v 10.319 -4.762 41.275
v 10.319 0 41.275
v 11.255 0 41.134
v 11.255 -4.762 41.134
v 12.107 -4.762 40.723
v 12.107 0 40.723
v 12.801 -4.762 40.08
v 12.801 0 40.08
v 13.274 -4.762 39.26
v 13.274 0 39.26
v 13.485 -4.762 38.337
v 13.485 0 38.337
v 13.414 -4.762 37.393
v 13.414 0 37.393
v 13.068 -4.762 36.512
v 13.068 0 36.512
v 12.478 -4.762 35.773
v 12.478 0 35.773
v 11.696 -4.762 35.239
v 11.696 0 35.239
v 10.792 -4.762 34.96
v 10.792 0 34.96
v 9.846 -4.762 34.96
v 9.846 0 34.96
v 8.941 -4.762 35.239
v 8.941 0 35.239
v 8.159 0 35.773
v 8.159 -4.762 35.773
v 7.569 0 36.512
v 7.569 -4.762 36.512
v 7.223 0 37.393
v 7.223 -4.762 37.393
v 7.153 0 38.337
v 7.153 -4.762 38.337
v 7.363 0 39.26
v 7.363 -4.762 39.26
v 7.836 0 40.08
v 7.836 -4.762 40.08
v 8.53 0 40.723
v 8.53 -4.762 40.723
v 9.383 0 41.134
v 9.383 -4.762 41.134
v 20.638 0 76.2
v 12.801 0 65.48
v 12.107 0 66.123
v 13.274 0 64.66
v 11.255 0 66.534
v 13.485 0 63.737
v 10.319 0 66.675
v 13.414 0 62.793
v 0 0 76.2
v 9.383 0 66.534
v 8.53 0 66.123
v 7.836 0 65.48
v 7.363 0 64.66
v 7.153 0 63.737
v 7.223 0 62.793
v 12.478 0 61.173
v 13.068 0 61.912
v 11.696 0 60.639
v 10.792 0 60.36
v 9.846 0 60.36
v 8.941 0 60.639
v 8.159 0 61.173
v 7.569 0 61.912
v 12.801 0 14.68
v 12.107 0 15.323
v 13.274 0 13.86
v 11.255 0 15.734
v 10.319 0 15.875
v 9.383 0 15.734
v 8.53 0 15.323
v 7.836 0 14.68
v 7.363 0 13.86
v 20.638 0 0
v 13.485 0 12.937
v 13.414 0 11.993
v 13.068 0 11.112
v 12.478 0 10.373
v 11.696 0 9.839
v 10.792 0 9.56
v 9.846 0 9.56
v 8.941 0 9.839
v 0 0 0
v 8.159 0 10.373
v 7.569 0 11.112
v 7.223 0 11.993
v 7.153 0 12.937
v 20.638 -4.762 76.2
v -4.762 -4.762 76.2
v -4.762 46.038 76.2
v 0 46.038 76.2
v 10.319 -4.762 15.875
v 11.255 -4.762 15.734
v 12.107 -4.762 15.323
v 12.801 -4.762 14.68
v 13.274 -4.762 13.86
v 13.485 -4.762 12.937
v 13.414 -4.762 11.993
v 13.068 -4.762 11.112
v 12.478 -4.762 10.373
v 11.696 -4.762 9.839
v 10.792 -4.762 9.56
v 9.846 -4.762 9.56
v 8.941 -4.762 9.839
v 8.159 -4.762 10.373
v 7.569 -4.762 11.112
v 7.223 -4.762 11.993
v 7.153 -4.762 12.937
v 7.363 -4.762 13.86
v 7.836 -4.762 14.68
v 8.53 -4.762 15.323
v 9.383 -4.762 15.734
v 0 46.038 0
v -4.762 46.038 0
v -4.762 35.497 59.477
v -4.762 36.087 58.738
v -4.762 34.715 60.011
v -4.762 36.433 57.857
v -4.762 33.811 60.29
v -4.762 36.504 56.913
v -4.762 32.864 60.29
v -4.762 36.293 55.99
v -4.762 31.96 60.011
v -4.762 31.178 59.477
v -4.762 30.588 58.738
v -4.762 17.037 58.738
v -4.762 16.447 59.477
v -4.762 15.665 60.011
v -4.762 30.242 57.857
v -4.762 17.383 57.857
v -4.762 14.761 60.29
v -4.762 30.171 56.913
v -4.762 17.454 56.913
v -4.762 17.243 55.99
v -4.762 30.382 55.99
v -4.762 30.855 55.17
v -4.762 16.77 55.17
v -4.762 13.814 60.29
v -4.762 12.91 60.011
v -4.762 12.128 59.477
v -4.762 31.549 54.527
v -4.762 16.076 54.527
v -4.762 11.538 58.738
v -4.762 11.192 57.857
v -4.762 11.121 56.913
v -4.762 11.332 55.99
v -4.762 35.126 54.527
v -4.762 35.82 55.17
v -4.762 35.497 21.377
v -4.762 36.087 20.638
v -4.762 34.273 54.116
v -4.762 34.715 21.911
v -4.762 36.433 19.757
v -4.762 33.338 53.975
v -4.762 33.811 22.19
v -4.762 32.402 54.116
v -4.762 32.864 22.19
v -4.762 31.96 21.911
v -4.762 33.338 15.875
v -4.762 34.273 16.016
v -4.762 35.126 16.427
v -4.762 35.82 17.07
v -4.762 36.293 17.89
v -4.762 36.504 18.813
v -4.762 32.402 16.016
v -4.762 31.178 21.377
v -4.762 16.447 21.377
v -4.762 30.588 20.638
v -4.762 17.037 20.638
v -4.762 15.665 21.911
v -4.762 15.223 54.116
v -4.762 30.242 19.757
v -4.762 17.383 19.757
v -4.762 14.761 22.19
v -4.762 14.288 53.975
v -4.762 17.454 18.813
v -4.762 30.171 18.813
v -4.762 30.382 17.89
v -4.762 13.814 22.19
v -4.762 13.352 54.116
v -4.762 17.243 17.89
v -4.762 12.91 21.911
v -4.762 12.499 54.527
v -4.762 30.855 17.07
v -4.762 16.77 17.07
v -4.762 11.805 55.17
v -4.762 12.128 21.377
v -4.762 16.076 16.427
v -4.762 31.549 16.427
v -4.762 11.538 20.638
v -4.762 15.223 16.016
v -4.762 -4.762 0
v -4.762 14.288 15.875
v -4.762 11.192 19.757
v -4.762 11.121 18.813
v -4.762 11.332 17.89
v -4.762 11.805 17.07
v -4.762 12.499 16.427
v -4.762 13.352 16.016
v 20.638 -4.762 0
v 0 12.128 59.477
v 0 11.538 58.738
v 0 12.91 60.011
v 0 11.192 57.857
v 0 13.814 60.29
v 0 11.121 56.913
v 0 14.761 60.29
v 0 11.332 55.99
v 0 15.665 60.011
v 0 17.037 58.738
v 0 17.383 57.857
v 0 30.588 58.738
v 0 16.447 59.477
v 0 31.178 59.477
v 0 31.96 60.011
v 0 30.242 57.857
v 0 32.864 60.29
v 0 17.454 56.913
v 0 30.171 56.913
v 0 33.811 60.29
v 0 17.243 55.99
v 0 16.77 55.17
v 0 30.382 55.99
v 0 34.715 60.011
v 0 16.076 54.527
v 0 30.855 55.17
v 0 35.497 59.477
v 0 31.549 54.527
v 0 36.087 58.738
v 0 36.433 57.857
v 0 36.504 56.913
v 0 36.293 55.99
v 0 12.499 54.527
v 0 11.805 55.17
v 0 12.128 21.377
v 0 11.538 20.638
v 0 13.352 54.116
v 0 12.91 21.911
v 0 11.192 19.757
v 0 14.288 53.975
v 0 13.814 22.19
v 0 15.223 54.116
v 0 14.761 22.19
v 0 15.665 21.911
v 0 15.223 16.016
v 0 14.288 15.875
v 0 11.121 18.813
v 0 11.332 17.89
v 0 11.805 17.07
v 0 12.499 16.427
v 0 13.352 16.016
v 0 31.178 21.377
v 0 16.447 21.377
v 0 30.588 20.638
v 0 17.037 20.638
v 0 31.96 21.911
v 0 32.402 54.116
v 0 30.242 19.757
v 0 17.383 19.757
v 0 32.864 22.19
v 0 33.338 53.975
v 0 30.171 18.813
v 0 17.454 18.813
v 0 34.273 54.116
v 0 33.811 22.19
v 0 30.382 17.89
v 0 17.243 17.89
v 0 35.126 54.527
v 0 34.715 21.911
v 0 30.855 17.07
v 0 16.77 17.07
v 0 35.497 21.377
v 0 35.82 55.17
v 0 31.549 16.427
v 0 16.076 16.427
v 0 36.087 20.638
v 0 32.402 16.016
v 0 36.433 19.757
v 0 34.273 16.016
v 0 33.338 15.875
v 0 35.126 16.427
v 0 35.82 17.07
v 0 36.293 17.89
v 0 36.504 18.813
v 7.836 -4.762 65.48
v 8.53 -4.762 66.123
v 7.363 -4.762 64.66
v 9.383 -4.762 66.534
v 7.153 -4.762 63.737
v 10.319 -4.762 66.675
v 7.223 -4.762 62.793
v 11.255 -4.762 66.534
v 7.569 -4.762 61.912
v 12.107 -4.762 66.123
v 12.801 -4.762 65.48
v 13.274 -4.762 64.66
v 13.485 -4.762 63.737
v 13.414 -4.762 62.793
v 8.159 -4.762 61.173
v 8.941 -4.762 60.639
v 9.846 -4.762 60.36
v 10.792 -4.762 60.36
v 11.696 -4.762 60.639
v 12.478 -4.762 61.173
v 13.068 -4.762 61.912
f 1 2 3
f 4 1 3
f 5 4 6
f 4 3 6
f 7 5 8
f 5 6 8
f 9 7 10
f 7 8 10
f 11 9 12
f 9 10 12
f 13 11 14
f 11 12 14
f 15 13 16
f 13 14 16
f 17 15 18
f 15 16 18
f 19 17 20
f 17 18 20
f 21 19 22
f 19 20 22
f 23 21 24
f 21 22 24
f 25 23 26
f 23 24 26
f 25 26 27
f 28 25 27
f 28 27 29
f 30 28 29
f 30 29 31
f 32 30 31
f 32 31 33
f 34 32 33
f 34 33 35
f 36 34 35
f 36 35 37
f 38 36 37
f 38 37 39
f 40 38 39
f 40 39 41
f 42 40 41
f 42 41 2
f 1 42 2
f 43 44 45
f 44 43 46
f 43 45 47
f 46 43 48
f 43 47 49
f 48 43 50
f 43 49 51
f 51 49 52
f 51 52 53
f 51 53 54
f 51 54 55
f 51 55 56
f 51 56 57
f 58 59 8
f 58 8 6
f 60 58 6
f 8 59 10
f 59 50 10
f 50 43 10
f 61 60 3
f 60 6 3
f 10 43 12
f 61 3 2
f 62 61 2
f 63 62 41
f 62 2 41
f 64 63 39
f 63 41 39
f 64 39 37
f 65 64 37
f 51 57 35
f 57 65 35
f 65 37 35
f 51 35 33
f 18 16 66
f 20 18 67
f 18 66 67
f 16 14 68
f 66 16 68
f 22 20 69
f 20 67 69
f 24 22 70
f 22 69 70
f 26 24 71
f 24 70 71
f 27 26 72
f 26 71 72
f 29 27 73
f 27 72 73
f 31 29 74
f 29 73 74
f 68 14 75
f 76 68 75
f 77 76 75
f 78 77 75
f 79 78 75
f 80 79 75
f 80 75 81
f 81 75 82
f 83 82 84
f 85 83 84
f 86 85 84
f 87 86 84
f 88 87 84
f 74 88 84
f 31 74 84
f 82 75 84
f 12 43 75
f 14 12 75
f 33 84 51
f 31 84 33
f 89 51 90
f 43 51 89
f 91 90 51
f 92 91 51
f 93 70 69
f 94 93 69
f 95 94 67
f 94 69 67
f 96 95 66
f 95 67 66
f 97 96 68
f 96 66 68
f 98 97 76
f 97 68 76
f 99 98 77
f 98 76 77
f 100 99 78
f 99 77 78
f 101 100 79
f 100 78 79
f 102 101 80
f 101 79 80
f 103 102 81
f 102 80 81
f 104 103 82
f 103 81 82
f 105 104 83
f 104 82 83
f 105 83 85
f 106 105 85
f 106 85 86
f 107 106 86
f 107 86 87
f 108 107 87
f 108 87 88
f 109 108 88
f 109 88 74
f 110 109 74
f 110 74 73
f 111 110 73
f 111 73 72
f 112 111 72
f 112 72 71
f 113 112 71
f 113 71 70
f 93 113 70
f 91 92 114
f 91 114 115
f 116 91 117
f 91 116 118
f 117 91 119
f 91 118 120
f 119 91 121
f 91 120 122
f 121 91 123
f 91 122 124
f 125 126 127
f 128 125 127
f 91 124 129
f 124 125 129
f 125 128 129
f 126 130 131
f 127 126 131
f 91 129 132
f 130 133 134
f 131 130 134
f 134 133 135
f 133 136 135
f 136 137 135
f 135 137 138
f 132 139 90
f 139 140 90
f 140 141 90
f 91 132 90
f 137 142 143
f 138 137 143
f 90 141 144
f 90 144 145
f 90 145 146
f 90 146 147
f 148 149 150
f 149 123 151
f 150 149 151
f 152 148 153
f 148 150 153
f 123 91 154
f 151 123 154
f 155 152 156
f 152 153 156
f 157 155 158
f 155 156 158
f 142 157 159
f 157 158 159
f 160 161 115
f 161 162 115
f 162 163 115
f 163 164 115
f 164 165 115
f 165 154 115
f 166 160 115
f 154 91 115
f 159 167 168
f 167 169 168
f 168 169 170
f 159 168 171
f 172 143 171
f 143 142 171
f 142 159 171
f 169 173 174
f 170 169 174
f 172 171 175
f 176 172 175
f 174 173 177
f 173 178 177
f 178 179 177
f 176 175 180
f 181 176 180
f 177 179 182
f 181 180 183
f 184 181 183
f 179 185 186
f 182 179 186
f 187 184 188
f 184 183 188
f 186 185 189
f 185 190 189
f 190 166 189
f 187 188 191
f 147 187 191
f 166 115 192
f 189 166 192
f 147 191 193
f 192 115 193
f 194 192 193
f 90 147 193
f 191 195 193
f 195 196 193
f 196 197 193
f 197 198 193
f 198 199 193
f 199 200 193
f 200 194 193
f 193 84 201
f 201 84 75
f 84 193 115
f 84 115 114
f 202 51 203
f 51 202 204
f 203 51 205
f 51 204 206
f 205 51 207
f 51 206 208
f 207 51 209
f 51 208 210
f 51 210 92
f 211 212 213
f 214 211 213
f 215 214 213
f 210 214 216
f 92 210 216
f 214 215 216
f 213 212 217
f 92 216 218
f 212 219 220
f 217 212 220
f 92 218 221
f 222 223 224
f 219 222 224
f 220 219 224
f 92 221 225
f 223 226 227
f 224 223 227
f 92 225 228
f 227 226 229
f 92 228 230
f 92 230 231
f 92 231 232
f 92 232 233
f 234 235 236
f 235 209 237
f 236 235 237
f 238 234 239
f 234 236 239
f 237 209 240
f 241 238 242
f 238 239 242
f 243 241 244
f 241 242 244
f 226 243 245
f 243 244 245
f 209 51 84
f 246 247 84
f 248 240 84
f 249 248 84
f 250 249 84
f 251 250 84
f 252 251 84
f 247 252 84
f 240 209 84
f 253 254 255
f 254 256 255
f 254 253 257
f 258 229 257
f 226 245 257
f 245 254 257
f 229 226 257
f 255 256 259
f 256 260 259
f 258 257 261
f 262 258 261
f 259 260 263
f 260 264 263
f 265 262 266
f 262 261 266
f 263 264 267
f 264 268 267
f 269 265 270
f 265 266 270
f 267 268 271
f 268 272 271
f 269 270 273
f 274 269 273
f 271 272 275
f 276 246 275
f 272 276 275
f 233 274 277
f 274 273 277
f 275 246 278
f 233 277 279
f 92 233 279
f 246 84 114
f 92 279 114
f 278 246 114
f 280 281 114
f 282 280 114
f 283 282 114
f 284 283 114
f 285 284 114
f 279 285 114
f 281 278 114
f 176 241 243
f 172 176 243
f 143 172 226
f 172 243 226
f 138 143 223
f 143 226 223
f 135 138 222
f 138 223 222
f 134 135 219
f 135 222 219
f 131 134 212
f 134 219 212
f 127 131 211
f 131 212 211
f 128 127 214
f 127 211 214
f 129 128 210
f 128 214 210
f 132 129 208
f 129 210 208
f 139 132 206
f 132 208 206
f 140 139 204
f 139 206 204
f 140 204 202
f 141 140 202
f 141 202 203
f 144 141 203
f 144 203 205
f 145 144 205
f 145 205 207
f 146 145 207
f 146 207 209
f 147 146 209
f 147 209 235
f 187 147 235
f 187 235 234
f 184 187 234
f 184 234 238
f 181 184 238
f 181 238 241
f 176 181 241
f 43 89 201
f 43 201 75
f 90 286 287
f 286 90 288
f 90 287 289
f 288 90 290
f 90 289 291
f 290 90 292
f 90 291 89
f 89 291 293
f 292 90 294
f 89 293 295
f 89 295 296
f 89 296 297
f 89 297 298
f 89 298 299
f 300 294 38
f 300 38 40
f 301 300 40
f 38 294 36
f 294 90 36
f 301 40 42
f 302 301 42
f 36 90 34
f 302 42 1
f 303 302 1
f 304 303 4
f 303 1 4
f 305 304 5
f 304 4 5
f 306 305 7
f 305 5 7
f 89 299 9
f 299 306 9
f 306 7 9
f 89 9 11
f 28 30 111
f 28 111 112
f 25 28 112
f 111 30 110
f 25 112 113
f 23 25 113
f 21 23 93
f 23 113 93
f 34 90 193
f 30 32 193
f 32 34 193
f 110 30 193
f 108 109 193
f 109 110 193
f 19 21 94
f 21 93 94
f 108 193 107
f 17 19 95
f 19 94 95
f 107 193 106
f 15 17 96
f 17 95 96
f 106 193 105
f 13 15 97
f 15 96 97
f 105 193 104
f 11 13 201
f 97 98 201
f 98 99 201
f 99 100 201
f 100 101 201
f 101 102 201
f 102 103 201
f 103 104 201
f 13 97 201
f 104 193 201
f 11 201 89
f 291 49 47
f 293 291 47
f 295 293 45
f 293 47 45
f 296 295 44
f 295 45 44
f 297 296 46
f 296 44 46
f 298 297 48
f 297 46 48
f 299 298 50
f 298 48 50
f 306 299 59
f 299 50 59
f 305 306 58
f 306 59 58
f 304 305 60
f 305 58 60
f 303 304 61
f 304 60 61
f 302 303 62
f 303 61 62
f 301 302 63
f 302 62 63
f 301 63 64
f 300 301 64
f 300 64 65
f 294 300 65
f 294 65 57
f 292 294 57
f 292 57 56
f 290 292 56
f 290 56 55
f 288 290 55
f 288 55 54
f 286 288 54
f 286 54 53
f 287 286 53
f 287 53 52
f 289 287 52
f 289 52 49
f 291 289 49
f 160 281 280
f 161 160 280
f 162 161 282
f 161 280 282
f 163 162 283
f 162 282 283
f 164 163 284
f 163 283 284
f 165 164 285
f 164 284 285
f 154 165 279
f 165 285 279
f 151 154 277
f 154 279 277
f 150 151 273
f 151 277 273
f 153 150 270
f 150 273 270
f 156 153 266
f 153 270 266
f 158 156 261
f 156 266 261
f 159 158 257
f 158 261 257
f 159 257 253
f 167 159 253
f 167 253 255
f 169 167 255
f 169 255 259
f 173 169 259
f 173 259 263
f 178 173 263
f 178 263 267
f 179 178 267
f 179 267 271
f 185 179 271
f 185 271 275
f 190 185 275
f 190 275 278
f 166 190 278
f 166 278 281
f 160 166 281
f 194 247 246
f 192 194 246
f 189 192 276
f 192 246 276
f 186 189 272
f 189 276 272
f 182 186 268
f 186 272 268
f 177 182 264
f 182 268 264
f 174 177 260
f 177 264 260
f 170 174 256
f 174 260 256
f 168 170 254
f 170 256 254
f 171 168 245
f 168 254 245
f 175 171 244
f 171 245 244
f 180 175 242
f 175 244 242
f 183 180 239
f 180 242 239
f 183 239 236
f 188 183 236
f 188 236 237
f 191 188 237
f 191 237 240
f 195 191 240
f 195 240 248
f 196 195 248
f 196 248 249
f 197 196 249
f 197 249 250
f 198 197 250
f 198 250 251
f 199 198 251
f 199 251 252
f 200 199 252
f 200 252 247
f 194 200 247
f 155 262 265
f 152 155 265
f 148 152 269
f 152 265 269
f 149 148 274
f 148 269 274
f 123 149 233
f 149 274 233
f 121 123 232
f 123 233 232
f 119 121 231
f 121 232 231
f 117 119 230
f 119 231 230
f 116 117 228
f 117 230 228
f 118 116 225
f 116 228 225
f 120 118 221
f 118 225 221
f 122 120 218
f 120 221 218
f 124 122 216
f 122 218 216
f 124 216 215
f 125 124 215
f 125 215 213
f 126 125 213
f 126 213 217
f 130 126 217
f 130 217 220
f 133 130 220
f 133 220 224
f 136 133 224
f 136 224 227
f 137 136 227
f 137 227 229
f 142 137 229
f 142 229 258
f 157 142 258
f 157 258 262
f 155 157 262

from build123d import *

# Parameters (mm, degrees)
BOSS_EXTRUDE1_DEPTH = 76.2
CUT_EXTRUDE1_REACH  = 93.388
SKETCH2_R           = 3.175
CUT_EXTRUDE2_REACH  = 93.388
SKETCH3_R           = 3.175


with BuildPart() as part:
    # Sketch1 → Boss-Extrude1 (new body)
    with BuildSketch(Plane.XY):
        Polygon((0, 0), (0, 46.0375), (-4.7625, 46.0375), (-4.7625, -4.7625), (20.6375, -4.7625), (20.6375, 0), align=None)
    extrude(amount=BOSS_EXTRUDE1_DEPTH)

    # Sketch2 → Cut-Extrude1 (cut, up to next)
    with BuildSketch(Plane(origin=(0, 0, 0), x_dir=(0, 0, -1), z_dir=(1, 0, 0)), mode=Mode.PRIVATE) as cut_extrude1_sk1:
        with Locations((-57.15, 33.3375)):
            Circle(SKETCH2_R)
    cut_extrude1_tool1 = extrude(cut_extrude1_sk1.sketch, amount=-CUT_EXTRUDE1_REACH, mode=Mode.PRIVATE) & part.part
    # Sketch2 → Cut-Extrude1 (cut, up to next)
    with BuildSketch(Plane(origin=(0, 0, 0), x_dir=(0, 0, -1), z_dir=(1, 0, 0)), mode=Mode.PRIVATE) as cut_extrude1_sk2:
        with Locations((-19.05, 33.3375)):
            Circle(SKETCH2_R)
    cut_extrude1_tool2 = extrude(cut_extrude1_sk2.sketch, amount=-CUT_EXTRUDE1_REACH, mode=Mode.PRIVATE) & part.part
    # Sketch2 → Cut-Extrude1 (cut, up to next)
    with BuildSketch(Plane(origin=(0, 0, 0), x_dir=(0, 0, -1), z_dir=(1, 0, 0)), mode=Mode.PRIVATE) as cut_extrude1_sk3:
        with Locations((-19.05, 14.2875)):
            Circle(SKETCH2_R)
    cut_extrude1_tool3 = extrude(cut_extrude1_sk3.sketch, amount=-CUT_EXTRUDE1_REACH, mode=Mode.PRIVATE) & part.part
    # Sketch2 → Cut-Extrude1 (cut, up to next)
    with BuildSketch(Plane(origin=(0, 0, 0), x_dir=(0, 0, -1), z_dir=(1, 0, 0)), mode=Mode.PRIVATE) as cut_extrude1_sk4:
        with Locations((-57.15, 14.2875)):
            Circle(SKETCH2_R)
    cut_extrude1_tool4 = extrude(cut_extrude1_sk4.sketch, amount=-CUT_EXTRUDE1_REACH, mode=Mode.PRIVATE) & part.part
    add(cut_extrude1_tool1.solids().sort_by_distance((0, 33.3375, 57.15))[0], mode=Mode.SUBTRACT)
    add(cut_extrude1_tool2.solids().sort_by_distance((0, 33.3375, 19.05))[0], mode=Mode.SUBTRACT)
    add(cut_extrude1_tool3.solids().sort_by_distance((0, 14.2875, 19.05))[0], mode=Mode.SUBTRACT)
    add(cut_extrude1_tool4.solids().sort_by_distance((0, 14.2875, 57.15))[0], mode=Mode.SUBTRACT)

    # Sketch3 → Cut-Extrude2 (cut, up to next)
    with BuildSketch(Plane(origin=(0, 0, 0), x_dir=(1, 0, 0), z_dir=(0, 1, 0)), mode=Mode.PRIVATE) as cut_extrude2_sk1:
        with Locations(Location((10.31875, -12.7, 0), (0, 0, 270))):
            Circle(SKETCH3_R)
    cut_extrude2_tool1 = extrude(cut_extrude2_sk1.sketch, amount=-CUT_EXTRUDE2_REACH, mode=Mode.PRIVATE) & part.part
    # Sketch3 → Cut-Extrude2 (cut, up to next)
    with BuildSketch(Plane(origin=(0, 0, 0), x_dir=(1, 0, 0), z_dir=(0, 1, 0)), mode=Mode.PRIVATE) as cut_extrude2_sk2:
        with Locations(Location((10.31875, -63.5, 0), (0, 0, 270))):
            Circle(SKETCH3_R)
    cut_extrude2_tool2 = extrude(cut_extrude2_sk2.sketch, amount=-CUT_EXTRUDE2_REACH, mode=Mode.PRIVATE) & part.part
    # Sketch3 → Cut-Extrude2 (cut, up to next)
    with BuildSketch(Plane(origin=(0, 0, 0), x_dir=(1, 0, 0), z_dir=(0, 1, 0)), mode=Mode.PRIVATE) as cut_extrude2_sk3:
        with Locations(Location((10.31875, -38.1, 0), (0, 0, 270))):
            Circle(SKETCH3_R)
    cut_extrude2_tool3 = extrude(cut_extrude2_sk3.sketch, amount=-CUT_EXTRUDE2_REACH, mode=Mode.PRIVATE) & part.part
    add(cut_extrude2_tool1.solids().sort_by_distance((10.31875, 0, 12.7))[0], mode=Mode.SUBTRACT)
    add(cut_extrude2_tool2.solids().sort_by_distance((10.31875, 0, 63.5))[0], mode=Mode.SUBTRACT)
    add(cut_extrude2_tool3.solids().sort_by_distance((10.31875, 0, 38.1))[0], mode=Mode.SUBTRACT)


solid = part.part
